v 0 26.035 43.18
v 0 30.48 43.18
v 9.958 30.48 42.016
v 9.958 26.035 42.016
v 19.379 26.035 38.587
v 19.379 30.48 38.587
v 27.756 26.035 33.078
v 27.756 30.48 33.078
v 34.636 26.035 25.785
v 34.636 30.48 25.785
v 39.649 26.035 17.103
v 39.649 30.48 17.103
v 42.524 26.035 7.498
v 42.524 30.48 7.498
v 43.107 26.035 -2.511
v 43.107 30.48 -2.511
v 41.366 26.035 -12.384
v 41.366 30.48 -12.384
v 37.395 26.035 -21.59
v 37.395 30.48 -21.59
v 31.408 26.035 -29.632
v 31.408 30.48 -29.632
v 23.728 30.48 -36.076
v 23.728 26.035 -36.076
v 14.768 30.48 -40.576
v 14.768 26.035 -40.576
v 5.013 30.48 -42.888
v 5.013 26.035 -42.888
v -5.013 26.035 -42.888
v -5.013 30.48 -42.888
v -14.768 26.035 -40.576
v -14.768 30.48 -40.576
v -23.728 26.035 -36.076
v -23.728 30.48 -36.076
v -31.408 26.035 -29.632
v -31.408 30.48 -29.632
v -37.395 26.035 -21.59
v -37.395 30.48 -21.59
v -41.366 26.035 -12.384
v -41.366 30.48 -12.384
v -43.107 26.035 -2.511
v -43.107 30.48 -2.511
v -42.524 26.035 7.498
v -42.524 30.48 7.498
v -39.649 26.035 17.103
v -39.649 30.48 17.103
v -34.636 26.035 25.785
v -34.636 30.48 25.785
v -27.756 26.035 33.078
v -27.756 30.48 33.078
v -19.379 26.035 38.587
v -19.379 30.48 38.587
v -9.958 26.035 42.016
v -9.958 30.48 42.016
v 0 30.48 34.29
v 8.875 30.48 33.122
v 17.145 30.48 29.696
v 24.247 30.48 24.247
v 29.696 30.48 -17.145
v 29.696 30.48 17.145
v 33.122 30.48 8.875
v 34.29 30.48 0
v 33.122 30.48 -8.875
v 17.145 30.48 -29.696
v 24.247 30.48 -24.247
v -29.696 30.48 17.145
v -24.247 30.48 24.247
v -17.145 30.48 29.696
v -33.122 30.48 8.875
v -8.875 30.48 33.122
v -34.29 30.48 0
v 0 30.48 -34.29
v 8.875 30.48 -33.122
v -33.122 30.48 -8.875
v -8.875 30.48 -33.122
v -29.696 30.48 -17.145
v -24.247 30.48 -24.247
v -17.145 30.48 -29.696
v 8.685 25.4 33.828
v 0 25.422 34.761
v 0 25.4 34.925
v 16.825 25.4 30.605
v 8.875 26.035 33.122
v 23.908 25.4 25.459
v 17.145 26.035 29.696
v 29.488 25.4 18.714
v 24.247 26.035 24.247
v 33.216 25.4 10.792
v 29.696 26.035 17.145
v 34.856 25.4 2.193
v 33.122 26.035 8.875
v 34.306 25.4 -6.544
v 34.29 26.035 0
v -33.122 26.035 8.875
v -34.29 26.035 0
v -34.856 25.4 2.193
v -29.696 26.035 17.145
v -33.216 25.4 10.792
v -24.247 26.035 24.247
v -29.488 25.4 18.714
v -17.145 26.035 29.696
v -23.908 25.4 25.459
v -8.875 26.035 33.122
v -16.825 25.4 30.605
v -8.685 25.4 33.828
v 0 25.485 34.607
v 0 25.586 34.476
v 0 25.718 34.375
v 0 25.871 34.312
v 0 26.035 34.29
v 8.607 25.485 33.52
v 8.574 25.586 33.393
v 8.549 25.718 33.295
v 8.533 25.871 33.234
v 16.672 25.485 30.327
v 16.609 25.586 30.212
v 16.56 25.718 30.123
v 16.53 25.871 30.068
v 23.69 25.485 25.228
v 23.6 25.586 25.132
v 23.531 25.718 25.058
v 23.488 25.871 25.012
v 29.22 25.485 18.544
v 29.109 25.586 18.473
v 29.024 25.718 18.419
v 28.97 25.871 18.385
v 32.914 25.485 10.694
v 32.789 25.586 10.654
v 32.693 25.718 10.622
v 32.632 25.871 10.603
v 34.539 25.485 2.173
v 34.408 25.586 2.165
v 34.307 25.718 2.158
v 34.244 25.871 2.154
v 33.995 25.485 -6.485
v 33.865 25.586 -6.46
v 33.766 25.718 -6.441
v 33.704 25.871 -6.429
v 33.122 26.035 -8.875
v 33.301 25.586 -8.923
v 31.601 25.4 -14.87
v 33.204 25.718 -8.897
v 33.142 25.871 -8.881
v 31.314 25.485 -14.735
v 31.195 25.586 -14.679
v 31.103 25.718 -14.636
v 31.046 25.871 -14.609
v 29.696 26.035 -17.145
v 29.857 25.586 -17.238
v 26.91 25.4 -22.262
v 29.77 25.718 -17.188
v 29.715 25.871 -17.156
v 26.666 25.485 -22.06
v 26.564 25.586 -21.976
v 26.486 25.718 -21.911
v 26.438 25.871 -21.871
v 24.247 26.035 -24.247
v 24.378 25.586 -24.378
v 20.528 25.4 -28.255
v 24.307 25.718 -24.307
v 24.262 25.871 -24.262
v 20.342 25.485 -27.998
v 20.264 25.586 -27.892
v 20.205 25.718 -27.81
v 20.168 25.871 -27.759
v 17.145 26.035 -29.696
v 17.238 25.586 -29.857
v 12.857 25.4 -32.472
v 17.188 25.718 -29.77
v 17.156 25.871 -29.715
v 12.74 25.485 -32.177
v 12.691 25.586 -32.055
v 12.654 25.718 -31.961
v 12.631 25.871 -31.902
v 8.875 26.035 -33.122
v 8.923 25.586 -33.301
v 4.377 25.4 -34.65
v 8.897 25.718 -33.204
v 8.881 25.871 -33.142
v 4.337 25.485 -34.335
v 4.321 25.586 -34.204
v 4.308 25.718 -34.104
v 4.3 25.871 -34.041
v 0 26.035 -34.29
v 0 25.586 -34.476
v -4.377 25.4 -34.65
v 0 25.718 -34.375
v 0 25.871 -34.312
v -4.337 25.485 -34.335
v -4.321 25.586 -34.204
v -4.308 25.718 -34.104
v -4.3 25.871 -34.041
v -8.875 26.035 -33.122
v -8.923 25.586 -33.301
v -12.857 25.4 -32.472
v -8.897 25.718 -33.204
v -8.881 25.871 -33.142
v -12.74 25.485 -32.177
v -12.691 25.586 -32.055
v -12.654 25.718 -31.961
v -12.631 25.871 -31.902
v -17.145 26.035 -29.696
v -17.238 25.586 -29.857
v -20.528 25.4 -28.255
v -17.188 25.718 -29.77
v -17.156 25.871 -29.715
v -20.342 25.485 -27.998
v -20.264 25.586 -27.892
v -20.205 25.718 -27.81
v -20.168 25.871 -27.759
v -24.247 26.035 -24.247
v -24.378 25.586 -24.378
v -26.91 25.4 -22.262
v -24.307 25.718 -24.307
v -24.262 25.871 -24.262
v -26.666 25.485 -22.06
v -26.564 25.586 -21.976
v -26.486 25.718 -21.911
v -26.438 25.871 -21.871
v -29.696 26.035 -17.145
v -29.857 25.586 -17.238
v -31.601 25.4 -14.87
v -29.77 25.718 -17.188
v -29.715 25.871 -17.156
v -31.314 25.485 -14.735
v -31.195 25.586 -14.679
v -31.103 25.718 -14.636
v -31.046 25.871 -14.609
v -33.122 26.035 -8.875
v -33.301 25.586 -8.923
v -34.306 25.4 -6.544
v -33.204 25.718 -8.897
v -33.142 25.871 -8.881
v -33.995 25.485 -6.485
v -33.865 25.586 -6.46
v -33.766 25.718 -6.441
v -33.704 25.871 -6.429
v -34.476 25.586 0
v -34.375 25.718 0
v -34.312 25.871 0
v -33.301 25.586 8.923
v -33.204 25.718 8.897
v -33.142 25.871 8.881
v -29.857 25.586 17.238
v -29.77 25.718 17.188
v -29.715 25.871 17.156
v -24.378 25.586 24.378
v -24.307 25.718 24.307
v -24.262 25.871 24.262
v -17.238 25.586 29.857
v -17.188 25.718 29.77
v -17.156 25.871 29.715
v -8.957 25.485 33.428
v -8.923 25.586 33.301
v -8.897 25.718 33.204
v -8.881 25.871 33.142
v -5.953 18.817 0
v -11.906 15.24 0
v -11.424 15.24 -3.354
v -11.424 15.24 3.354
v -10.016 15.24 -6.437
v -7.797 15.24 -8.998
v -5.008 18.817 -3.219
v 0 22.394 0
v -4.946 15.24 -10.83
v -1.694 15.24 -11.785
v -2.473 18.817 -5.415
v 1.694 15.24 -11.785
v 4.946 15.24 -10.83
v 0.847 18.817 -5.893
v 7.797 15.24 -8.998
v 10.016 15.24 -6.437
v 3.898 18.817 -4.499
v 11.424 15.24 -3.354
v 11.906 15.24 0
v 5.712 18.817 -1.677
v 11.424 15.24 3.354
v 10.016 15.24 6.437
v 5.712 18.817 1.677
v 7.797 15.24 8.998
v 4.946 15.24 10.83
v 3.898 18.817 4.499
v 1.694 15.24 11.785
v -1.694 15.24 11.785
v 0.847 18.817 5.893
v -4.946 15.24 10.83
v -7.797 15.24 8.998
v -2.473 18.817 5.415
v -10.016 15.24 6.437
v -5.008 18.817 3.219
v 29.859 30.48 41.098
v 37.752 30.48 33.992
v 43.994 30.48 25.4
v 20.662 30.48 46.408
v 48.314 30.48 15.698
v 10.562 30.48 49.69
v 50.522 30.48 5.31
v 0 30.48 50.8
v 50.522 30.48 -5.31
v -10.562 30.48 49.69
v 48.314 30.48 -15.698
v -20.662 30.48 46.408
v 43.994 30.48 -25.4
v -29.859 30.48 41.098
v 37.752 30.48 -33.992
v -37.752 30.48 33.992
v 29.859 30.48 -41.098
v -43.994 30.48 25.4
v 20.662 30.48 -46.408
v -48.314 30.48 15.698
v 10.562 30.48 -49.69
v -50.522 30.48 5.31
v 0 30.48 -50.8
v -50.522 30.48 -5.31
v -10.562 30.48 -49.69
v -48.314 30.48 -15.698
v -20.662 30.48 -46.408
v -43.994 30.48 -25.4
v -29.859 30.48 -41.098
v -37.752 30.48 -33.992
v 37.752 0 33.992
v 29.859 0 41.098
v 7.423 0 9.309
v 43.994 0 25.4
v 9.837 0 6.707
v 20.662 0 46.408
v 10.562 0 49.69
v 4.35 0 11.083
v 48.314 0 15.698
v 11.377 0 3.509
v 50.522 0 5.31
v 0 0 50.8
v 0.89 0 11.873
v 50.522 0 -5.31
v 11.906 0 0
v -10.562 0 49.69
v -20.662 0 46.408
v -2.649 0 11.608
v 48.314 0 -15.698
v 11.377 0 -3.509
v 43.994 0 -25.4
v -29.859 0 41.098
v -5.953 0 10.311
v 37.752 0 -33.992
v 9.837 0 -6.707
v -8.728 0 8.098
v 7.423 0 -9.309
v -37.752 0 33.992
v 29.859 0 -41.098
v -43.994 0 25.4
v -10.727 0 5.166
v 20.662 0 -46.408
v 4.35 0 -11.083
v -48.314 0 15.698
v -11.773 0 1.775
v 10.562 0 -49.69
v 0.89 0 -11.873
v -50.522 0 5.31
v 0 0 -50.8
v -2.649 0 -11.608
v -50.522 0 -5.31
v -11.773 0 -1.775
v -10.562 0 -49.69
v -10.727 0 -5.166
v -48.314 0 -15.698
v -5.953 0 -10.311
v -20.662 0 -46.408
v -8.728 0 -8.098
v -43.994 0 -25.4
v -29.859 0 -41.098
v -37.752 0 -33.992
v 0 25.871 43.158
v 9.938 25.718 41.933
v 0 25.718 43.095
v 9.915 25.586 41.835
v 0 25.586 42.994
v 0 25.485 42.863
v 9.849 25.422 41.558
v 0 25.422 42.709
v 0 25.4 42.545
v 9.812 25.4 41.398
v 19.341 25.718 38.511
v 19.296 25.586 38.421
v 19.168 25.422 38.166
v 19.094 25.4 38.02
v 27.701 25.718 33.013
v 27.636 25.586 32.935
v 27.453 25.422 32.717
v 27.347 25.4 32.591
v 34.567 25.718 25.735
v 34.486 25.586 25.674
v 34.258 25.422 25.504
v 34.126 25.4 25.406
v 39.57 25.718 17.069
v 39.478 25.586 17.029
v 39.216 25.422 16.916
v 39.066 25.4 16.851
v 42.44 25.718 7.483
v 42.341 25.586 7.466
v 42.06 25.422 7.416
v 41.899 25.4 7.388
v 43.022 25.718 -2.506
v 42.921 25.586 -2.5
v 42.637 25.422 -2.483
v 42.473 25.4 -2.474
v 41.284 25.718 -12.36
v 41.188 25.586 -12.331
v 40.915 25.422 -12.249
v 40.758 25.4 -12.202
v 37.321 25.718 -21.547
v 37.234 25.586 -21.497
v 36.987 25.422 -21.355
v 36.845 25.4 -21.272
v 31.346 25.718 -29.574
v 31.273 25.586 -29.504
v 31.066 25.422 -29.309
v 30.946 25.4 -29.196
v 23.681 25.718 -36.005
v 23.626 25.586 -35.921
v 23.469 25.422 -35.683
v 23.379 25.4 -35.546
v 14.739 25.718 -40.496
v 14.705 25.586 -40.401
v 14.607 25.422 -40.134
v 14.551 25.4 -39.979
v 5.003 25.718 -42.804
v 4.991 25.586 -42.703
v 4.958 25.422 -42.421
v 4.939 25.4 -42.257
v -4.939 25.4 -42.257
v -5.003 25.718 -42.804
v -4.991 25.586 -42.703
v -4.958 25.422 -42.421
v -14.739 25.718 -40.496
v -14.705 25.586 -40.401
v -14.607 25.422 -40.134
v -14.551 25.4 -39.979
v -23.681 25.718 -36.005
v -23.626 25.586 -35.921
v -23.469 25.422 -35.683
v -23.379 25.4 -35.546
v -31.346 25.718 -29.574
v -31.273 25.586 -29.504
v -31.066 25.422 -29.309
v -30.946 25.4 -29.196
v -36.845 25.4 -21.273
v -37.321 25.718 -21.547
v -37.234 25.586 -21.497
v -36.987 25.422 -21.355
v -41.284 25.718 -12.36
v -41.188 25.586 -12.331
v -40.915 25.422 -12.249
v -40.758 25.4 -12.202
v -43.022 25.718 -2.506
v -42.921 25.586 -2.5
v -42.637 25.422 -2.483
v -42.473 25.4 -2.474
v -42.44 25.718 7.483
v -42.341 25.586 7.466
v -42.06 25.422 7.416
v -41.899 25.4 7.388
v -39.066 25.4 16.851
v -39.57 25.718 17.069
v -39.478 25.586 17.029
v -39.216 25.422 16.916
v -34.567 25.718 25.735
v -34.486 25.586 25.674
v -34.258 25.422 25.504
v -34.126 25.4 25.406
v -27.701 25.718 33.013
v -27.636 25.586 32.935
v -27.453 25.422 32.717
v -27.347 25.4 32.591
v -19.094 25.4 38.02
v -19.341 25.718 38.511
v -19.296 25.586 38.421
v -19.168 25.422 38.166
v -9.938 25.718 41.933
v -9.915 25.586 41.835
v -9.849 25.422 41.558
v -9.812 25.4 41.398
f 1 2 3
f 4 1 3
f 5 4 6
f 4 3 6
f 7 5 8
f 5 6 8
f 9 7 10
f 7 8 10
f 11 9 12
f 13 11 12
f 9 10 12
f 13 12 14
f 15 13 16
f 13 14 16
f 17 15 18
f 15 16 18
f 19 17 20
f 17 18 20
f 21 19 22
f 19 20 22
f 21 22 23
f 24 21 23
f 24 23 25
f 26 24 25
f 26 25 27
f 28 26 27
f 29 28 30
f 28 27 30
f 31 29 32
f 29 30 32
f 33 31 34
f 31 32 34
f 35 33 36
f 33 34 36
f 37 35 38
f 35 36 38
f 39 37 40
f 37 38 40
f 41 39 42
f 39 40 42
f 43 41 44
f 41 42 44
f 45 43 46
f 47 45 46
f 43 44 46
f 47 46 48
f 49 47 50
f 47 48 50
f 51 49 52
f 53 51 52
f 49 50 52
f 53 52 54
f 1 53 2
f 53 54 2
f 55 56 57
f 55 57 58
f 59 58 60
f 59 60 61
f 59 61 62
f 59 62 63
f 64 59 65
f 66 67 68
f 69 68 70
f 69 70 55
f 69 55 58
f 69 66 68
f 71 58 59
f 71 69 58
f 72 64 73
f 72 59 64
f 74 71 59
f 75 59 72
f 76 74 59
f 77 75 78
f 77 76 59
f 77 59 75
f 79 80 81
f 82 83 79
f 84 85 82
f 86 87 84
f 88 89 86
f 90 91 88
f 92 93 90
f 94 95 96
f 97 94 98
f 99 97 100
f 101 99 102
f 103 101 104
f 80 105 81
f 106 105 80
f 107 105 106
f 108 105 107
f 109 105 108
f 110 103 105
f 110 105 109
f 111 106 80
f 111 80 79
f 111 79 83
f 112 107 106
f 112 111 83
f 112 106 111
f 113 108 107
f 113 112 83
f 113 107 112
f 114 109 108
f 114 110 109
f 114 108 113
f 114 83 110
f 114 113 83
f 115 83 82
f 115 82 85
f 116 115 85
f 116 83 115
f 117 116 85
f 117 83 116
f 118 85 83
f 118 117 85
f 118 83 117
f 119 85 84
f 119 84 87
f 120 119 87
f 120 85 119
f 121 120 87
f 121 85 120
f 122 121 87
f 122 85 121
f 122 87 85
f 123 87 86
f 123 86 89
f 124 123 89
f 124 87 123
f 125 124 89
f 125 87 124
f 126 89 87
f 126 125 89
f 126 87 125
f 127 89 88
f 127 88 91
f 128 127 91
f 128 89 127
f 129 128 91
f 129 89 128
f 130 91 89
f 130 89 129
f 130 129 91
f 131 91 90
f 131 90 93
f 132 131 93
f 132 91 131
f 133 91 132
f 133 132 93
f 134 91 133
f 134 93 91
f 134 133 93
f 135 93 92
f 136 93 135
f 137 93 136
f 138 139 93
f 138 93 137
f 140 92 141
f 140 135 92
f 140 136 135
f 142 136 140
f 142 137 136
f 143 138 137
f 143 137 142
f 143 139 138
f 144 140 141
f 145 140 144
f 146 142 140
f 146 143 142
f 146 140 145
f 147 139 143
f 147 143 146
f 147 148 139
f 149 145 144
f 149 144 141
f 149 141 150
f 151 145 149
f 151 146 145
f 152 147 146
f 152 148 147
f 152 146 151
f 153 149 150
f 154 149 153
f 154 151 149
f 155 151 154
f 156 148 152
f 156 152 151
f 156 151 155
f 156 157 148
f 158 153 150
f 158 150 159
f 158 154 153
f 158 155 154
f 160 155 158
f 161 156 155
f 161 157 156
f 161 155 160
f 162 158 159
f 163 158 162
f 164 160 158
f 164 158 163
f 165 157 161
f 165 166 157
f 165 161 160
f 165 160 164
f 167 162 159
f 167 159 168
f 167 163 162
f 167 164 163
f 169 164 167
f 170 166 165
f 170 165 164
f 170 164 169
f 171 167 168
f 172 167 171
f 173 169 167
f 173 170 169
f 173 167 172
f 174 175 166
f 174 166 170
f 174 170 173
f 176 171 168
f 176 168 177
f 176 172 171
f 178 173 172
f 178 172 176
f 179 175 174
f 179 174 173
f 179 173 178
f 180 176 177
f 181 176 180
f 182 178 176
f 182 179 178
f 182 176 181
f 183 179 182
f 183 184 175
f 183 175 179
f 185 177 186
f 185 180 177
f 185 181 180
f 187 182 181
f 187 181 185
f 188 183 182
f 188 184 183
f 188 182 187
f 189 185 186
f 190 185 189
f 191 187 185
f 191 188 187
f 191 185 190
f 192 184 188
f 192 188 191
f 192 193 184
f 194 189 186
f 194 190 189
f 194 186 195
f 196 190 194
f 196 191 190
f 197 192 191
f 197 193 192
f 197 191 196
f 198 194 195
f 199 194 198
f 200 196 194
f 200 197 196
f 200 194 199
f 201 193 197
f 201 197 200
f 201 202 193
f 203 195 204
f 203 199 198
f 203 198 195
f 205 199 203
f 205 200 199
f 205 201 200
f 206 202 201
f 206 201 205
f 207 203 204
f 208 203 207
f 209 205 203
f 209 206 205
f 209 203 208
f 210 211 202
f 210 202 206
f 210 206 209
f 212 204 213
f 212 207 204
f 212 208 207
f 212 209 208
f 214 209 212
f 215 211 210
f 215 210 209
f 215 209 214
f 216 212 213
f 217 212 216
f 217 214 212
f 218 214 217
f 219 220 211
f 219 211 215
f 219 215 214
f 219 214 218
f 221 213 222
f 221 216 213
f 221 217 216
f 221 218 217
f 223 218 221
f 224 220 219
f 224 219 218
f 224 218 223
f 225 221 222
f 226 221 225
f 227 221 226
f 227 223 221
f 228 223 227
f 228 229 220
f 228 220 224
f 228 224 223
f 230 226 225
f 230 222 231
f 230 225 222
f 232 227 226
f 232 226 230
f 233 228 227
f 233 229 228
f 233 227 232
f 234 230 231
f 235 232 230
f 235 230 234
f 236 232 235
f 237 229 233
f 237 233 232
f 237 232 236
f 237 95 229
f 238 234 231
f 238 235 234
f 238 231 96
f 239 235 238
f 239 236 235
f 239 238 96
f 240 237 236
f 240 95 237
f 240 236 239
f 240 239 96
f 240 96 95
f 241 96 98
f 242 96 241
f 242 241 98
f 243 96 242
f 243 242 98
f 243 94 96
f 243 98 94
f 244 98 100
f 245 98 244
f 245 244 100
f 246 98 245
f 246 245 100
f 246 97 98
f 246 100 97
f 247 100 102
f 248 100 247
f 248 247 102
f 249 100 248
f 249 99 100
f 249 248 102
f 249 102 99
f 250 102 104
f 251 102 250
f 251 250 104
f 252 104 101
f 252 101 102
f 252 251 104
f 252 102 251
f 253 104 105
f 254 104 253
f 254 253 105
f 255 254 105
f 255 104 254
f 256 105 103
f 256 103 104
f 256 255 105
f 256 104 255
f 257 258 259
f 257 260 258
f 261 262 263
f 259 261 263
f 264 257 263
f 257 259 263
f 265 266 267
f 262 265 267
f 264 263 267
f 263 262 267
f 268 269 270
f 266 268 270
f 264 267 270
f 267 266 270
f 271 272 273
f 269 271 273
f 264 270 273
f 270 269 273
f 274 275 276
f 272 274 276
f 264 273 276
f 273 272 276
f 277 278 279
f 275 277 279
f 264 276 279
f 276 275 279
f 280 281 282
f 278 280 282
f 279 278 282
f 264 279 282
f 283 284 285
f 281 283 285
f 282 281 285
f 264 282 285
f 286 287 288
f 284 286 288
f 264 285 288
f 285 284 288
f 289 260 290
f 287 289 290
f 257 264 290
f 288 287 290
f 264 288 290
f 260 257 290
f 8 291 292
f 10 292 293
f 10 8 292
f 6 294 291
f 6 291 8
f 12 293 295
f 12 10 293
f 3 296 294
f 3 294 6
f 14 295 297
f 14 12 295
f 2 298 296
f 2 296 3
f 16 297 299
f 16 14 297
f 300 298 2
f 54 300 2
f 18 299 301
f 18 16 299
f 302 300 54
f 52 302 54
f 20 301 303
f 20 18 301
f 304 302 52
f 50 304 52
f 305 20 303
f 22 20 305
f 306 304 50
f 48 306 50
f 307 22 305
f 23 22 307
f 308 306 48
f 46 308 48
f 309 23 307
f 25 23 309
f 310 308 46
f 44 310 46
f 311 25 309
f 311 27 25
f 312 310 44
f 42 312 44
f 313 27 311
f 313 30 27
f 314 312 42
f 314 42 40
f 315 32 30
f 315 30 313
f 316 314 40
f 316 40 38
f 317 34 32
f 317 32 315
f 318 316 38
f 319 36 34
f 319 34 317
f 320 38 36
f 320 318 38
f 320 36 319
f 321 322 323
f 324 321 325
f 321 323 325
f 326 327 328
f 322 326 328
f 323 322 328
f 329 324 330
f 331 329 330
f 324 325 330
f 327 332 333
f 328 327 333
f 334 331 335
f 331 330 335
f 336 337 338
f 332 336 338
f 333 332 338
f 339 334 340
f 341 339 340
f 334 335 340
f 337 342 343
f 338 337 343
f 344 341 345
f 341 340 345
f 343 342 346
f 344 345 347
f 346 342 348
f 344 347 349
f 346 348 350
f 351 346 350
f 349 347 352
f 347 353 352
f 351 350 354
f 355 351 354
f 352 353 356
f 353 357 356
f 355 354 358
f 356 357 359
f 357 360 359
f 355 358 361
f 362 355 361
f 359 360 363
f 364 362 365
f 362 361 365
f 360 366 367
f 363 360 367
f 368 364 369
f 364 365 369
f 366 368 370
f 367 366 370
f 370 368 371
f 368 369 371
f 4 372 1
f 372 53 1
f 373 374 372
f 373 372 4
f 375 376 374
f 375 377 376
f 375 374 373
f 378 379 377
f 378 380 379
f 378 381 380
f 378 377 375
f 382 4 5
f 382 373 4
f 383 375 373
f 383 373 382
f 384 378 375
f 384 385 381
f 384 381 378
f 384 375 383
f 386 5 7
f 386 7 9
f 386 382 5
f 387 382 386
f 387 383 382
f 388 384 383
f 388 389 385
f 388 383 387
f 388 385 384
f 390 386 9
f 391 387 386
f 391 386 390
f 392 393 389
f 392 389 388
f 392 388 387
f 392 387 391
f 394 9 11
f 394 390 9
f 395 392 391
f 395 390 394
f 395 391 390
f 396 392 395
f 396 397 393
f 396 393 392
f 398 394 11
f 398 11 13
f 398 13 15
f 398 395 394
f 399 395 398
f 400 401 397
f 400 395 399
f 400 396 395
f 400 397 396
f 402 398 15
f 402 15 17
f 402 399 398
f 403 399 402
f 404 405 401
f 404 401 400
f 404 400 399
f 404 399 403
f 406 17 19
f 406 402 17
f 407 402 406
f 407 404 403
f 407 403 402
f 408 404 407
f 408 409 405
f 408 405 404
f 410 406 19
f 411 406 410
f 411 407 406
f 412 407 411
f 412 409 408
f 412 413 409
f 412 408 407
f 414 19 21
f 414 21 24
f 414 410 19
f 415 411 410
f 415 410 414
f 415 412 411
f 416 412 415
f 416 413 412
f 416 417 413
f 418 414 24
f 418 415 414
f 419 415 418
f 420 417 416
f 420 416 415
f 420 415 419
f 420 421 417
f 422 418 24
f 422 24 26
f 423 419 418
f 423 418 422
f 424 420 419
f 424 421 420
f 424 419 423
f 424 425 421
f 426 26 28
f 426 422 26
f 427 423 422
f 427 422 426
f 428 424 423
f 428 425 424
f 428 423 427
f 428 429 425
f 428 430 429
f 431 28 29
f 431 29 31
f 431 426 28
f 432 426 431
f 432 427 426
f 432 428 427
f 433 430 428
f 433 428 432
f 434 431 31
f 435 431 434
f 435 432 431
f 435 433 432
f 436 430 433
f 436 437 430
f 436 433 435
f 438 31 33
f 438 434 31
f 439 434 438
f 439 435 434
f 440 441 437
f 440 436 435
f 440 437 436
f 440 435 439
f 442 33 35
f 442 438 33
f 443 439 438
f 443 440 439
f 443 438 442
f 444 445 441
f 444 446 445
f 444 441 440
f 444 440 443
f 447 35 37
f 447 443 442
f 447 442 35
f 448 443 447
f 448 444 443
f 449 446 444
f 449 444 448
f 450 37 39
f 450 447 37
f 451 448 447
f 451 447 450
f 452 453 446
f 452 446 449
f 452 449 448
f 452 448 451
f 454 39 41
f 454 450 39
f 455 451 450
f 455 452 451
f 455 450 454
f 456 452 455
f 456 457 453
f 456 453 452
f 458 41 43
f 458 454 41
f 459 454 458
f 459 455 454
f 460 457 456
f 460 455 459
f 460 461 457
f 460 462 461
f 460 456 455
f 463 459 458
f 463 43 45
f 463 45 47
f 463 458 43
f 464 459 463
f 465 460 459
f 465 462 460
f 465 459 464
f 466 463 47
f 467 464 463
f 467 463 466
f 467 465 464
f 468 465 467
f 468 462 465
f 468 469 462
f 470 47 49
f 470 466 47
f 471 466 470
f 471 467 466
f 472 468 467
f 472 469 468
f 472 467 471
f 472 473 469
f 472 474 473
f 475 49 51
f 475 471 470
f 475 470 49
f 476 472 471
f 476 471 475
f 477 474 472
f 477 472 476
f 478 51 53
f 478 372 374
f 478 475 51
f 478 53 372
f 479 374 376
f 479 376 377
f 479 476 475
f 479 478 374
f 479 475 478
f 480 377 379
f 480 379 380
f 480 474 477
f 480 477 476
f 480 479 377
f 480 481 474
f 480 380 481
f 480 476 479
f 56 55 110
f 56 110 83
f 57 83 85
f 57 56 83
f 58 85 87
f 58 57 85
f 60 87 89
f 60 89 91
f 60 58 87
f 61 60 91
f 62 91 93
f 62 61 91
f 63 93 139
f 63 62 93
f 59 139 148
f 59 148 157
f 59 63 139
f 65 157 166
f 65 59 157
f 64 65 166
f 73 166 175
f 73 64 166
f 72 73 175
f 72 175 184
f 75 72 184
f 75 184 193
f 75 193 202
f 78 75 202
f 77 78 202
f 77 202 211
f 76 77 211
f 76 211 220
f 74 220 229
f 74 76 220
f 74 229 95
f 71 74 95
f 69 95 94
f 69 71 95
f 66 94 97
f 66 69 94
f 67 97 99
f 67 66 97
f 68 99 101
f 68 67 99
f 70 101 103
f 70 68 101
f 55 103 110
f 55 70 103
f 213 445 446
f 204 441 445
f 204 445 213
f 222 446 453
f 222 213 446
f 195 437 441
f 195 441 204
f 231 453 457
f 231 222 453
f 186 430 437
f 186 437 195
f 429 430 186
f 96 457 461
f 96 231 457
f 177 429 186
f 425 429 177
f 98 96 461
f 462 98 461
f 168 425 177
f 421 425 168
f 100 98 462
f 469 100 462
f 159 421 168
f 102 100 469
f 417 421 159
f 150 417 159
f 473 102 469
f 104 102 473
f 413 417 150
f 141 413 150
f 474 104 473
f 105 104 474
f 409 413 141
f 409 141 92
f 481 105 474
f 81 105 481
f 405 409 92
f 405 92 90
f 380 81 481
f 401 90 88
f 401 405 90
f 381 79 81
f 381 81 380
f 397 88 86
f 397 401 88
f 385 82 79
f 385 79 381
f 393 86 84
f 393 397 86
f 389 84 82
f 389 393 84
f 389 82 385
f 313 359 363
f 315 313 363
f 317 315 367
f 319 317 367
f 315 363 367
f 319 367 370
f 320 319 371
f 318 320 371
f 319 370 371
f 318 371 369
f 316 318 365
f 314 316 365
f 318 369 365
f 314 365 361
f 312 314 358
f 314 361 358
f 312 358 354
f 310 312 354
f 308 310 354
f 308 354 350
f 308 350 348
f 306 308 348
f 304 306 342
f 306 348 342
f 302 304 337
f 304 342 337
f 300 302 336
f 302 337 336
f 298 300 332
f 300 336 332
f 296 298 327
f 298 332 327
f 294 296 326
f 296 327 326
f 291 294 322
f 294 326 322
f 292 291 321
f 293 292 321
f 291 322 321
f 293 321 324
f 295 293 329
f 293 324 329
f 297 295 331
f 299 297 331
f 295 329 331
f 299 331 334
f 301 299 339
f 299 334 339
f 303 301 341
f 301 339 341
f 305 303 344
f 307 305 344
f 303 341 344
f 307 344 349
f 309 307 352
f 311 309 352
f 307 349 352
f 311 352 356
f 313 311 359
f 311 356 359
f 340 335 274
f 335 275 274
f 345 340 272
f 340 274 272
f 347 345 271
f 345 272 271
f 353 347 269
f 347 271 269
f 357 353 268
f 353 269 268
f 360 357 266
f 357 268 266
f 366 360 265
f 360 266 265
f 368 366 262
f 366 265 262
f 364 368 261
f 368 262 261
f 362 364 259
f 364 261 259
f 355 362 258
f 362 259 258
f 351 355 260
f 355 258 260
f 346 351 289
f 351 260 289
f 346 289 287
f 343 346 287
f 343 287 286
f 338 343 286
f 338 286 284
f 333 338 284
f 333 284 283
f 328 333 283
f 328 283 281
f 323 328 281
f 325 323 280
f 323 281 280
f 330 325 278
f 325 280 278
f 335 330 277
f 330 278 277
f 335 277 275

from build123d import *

# Parameters (mm, degrees)
SKETCH1_R                 = 50.8
BOSS_EXTRUDE1_DEPTH       = 30.48
F_1_14_TAPPED_HOLE1_D     = 23.8125
F_1_14_TAPPED_HOLE1_DEPTH = 15.24
F_1_14_TAPPED_HOLE1_TIP   = 7.153996745
SKETCH4_R                 = 43.18
SKETCH4_R_2               = 34.29
CUT_EXTRUDE1_DEPTH        = 5.08
FILLET1_R                 = 0.635


with BuildPart() as part:
    # Sketch1 → Boss-Extrude1 (new body)
    with BuildSketch(Plane(origin=(0, 0, 0), x_dir=(1, 0, 0), z_dir=(0, 1, 0))):
        with Locations(Location((0, 0, 0), (0, 0, 90))):
            Circle(SKETCH1_R)
    extrude(amount=BOSS_EXTRUDE1_DEPTH)

    # 1-14 Tapped Hole1
    with Locations(Plane(origin=(0, 0, 0), x_dir=(-1, 0, 0), z_dir=(0, -1, 0))):
        with Locations((0, 0)):
            Hole(F_1_14_TAPPED_HOLE1_D / 2, depth=F_1_14_TAPPED_HOLE1_DEPTH)
            with Locations((0, 0, -(F_1_14_TAPPED_HOLE1_DEPTH + F_1_14_TAPPED_HOLE1_TIP / 2))):  # 118° drill point
                Cone(0, F_1_14_TAPPED_HOLE1_D / 2, F_1_14_TAPPED_HOLE1_TIP, mode=Mode.SUBTRACT)

    # Sketch4 → Cut-Extrude1 (cut)
    with BuildSketch(Plane(origin=(0, 30.48, 0), x_dir=(1, 0, 0), z_dir=(0, 1, 0))):
        with Locations(Location((0, 0, 0), (0, 0, 270))):
            Circle(SKETCH4_R)
        with Locations(Location((0, 0, 0), (0, 0, 270))):
            Circle(SKETCH4_R_2, mode=Mode.SUBTRACT)
    extrude(amount=-CUT_EXTRUDE1_DEPTH, mode=Mode.SUBTRACT)

    # Fillet1
    fillet1_edges = [part.edges().sort_by_distance(p)[0] for p in [
        (0, 25.4, -43.18),
        (0, 25.4, -34.29),
    ]]
    fillet(fillet1_edges, radius=FILLET1_R)


solid = part.part
